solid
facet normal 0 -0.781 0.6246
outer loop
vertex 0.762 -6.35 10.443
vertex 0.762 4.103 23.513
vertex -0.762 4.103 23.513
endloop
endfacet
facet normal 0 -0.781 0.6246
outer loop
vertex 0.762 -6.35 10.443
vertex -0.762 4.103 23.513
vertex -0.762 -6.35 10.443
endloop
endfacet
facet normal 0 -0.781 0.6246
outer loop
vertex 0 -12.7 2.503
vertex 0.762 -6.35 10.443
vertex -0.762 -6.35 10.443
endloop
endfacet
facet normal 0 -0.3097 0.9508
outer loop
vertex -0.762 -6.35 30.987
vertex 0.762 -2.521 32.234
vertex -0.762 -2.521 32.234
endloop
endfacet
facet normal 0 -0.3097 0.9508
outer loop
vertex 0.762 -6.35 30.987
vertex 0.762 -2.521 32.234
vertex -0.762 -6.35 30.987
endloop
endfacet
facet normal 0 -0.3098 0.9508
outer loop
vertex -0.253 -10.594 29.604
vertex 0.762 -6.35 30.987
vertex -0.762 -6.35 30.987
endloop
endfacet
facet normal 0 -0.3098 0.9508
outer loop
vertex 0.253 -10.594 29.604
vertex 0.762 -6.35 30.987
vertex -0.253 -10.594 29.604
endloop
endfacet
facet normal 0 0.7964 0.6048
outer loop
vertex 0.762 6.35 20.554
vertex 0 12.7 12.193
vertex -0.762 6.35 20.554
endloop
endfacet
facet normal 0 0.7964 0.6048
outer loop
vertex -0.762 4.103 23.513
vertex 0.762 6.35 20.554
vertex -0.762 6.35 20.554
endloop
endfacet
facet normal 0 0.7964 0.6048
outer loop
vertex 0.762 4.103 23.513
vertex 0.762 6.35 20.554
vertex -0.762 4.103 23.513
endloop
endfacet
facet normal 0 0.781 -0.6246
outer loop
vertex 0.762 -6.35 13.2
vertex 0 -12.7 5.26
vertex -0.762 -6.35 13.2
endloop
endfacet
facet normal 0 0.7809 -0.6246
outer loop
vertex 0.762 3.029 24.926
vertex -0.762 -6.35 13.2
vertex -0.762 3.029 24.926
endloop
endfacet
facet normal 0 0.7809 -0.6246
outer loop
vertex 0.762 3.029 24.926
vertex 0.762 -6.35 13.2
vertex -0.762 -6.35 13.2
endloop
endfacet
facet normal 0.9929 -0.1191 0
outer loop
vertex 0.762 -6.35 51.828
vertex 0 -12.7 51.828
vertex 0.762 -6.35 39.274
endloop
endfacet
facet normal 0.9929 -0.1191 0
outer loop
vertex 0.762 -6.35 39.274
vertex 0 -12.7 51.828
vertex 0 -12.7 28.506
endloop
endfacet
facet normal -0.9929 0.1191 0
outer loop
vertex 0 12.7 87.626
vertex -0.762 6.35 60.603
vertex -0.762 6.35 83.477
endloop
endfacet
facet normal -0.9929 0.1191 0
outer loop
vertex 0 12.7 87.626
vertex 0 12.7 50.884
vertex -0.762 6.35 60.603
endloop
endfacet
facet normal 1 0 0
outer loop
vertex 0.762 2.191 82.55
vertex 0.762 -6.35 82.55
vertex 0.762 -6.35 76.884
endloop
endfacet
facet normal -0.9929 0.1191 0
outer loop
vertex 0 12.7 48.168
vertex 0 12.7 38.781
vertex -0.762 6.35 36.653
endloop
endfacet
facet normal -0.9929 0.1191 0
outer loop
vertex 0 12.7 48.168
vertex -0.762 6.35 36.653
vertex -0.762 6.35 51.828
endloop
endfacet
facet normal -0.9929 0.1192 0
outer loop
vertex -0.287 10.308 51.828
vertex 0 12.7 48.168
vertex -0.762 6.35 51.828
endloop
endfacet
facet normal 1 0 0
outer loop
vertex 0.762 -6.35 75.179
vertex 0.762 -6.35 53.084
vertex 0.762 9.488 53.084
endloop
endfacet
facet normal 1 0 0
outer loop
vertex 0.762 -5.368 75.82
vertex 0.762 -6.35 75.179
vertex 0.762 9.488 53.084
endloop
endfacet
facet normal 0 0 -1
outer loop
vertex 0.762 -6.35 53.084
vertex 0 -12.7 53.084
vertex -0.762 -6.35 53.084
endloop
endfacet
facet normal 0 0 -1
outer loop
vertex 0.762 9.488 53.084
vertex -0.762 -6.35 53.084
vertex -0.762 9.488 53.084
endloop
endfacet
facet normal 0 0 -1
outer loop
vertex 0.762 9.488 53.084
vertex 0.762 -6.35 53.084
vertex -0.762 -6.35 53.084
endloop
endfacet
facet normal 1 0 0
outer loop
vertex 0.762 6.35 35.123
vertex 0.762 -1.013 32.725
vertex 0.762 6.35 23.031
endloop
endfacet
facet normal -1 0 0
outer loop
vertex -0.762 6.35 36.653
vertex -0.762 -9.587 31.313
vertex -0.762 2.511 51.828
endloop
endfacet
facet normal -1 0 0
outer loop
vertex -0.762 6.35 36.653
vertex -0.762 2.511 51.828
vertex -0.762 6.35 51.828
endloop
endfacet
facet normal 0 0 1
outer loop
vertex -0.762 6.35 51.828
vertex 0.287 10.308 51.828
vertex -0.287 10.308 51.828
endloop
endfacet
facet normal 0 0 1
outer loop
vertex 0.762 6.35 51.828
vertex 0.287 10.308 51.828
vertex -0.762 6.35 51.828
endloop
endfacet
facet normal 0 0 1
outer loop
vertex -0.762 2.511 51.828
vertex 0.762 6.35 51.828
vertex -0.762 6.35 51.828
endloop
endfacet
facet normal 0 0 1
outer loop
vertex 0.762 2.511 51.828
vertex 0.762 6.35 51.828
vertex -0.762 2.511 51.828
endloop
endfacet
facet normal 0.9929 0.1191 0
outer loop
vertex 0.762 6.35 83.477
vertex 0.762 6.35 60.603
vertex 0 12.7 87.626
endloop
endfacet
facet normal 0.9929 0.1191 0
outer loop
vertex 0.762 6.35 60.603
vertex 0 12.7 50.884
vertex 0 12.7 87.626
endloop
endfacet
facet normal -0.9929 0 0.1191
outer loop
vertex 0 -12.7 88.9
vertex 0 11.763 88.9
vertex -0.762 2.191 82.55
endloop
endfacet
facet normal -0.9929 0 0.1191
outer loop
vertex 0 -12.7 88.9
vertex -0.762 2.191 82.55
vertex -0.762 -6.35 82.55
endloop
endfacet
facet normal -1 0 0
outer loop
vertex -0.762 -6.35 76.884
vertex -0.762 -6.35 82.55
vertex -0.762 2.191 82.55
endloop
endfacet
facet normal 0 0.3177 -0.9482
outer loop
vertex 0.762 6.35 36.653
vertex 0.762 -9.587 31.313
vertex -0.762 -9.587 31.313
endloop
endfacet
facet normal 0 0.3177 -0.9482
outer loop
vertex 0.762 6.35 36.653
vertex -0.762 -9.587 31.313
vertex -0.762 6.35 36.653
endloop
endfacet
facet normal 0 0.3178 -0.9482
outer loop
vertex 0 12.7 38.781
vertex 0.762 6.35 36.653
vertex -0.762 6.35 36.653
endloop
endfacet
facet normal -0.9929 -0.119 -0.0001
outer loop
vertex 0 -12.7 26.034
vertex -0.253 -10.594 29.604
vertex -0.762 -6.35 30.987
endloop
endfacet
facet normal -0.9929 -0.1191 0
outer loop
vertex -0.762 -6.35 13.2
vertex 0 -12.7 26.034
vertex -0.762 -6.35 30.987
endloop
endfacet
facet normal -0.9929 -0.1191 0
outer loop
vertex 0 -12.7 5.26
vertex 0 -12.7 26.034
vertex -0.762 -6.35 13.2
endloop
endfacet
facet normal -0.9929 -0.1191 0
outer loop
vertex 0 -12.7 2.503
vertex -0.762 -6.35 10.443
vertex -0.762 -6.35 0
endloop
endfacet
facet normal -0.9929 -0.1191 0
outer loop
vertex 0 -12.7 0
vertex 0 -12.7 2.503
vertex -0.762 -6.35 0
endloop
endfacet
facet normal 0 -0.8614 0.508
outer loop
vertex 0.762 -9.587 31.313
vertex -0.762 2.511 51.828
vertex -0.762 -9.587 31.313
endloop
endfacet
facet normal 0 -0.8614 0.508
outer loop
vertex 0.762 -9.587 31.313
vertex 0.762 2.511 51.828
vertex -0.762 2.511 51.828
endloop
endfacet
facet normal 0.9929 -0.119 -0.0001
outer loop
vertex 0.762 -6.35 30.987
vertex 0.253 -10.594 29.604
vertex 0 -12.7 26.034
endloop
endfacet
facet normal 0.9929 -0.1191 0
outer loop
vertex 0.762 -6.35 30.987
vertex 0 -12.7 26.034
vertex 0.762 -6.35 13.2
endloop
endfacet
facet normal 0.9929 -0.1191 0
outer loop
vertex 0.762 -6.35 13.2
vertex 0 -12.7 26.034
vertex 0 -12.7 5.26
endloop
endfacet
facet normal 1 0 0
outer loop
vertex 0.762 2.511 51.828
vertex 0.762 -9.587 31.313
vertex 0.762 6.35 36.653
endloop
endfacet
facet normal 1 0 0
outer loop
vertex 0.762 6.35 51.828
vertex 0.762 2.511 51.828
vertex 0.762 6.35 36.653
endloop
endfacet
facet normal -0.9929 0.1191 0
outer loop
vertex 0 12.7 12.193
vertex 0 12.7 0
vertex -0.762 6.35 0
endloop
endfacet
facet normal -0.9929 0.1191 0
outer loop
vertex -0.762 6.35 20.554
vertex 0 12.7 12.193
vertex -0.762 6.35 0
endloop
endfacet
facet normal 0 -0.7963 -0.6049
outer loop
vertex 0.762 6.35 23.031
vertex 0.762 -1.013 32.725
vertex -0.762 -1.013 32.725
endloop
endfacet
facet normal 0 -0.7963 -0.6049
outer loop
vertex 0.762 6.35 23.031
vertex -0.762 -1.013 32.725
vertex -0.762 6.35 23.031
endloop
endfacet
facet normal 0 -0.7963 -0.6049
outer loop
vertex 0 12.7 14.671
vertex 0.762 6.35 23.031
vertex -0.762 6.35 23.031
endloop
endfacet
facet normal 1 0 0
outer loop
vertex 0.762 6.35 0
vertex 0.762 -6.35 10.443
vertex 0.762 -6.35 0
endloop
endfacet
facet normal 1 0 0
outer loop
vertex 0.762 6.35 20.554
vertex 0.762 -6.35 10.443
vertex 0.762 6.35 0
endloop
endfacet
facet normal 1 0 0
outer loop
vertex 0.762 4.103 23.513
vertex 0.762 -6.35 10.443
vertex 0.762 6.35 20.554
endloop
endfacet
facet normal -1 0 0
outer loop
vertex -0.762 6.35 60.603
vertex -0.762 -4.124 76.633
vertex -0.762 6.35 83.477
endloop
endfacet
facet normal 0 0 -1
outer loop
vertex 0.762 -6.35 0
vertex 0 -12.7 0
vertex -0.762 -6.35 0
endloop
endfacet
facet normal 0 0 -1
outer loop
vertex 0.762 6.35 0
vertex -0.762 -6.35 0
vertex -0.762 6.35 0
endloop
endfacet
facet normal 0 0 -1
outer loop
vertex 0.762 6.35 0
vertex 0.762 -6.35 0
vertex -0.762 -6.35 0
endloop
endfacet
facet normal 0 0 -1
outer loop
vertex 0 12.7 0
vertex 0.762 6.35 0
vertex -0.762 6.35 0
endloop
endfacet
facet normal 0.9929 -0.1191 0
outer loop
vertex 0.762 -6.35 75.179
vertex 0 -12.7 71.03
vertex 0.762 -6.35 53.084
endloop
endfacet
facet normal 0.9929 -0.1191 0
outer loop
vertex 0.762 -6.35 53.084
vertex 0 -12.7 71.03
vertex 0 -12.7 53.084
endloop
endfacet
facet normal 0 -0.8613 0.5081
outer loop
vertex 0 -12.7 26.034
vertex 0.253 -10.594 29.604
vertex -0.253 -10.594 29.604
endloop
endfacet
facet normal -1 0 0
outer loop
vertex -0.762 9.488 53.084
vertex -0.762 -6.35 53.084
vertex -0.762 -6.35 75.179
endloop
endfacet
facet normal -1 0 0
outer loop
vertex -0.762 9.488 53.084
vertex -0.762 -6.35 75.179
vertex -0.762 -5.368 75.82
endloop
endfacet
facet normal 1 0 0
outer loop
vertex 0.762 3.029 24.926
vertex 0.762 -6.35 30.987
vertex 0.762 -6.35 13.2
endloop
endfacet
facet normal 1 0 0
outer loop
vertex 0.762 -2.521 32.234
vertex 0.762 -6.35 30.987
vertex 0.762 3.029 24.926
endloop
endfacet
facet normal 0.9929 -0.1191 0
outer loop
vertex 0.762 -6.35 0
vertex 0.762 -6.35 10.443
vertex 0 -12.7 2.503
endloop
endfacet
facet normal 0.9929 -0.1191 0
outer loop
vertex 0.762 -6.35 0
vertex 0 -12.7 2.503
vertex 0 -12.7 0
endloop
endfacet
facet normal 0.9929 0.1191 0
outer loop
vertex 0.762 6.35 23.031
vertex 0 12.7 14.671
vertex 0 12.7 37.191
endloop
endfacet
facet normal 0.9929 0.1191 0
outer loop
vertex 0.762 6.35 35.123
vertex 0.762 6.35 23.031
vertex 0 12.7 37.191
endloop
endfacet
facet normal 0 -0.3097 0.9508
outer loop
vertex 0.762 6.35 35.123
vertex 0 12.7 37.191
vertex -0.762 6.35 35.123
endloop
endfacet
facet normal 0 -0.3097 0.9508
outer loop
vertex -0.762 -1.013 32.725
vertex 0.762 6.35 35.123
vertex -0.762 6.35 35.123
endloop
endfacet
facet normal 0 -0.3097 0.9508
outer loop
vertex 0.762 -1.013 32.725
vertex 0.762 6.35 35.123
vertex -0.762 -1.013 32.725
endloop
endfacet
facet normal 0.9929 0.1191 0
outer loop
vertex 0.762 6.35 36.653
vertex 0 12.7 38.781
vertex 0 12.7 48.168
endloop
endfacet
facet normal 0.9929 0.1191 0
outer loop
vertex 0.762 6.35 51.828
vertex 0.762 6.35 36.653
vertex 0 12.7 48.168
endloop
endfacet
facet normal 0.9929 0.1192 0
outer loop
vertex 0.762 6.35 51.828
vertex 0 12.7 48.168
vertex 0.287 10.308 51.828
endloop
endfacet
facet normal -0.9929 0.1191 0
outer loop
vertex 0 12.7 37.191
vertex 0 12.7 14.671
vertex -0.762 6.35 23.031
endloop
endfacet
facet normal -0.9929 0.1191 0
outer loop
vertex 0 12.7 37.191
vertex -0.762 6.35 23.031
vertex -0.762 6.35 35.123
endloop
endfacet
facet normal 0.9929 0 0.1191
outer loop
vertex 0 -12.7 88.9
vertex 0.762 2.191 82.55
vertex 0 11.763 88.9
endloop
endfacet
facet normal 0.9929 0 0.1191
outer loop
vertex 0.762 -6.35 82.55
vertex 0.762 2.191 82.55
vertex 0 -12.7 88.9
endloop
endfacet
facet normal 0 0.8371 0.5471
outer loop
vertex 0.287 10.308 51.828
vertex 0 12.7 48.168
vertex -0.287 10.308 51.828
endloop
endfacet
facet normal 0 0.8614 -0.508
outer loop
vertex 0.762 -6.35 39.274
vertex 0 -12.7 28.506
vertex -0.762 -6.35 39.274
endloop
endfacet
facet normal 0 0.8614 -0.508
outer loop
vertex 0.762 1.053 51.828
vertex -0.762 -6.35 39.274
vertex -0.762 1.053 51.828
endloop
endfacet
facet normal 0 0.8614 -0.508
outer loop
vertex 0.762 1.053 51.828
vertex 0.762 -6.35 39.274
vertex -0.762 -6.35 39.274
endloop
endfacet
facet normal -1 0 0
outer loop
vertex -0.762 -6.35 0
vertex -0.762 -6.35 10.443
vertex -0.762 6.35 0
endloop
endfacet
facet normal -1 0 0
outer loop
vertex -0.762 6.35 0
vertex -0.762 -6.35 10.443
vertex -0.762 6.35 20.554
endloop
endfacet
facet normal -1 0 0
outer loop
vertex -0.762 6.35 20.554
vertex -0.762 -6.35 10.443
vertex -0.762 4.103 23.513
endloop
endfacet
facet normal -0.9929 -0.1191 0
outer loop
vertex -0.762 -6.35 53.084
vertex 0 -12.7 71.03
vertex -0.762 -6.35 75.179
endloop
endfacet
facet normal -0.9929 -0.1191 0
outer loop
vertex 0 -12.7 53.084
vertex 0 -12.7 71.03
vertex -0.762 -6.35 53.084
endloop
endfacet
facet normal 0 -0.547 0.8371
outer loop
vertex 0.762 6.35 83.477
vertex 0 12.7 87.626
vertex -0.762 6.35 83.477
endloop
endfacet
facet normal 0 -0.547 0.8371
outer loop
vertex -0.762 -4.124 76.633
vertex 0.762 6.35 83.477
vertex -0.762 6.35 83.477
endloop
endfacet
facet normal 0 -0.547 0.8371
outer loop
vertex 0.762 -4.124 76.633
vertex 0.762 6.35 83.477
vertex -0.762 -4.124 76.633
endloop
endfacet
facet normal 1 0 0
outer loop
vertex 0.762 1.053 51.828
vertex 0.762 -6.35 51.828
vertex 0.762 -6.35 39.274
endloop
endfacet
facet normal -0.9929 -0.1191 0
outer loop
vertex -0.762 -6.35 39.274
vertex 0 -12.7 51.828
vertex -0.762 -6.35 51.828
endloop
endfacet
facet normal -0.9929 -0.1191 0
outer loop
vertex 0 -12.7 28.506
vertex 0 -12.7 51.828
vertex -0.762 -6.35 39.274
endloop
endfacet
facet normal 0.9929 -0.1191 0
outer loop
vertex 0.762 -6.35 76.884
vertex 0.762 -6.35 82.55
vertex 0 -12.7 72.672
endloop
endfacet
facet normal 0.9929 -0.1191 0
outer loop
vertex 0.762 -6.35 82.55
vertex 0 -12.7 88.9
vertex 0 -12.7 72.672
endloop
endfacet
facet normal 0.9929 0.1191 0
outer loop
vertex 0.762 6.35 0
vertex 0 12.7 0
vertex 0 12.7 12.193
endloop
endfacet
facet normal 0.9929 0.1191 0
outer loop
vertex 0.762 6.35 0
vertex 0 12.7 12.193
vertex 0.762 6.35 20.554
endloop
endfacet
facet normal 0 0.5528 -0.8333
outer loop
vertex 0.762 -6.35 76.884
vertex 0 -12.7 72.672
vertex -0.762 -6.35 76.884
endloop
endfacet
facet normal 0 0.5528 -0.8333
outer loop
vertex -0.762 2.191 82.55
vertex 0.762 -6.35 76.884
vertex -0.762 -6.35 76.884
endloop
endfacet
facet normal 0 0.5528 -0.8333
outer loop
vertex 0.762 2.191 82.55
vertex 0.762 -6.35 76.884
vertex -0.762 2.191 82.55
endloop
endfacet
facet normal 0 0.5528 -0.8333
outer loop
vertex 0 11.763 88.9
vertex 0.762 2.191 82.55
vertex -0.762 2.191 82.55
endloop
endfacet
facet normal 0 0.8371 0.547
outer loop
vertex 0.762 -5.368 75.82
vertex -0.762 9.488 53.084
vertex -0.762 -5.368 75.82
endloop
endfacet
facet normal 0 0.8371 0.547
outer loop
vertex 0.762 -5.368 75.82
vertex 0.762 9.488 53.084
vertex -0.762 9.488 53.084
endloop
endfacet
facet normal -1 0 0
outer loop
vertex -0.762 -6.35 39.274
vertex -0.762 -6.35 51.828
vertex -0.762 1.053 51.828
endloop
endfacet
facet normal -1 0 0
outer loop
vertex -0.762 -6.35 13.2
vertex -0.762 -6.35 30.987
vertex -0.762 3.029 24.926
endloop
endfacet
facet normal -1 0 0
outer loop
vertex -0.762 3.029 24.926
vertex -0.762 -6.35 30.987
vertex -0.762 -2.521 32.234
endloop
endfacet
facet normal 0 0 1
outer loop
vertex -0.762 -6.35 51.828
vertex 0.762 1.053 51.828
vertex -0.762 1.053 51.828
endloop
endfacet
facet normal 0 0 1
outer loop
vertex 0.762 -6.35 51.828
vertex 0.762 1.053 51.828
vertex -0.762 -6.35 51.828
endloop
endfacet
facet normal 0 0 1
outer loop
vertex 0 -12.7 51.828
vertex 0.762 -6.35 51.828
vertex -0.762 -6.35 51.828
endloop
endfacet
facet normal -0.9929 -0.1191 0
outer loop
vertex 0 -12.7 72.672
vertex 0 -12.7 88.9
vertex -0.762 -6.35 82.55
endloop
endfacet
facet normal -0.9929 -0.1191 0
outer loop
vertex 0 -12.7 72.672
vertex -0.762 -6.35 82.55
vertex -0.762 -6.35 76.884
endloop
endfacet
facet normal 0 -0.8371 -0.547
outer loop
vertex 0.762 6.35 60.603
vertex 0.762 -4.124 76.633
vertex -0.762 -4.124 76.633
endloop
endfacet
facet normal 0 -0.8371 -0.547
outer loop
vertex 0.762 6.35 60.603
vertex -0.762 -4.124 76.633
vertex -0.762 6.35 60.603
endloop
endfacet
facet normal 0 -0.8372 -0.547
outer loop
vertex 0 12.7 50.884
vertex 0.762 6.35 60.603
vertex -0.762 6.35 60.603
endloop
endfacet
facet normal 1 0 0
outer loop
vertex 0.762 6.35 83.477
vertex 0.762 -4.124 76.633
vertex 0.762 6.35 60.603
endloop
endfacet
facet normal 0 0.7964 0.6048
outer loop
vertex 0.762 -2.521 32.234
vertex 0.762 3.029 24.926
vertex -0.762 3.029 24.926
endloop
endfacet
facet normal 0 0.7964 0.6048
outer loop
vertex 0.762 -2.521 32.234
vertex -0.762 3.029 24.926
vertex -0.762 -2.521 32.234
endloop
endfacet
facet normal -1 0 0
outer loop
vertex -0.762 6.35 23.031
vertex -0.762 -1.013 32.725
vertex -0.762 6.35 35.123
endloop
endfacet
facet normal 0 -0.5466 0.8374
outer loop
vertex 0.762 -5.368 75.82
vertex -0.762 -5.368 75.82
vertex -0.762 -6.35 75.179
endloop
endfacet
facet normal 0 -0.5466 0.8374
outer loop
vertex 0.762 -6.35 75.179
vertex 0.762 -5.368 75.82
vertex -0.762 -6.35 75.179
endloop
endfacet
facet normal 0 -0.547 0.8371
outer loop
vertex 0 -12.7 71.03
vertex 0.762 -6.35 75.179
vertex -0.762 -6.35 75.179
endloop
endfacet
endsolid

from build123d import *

# Parameters (mm, degrees)
F1_DEPTH    = 0.762
F2_SIZE2    = 0.762
F2_SIZE     = 6.35
F2_2_SIZE2  = 0.76199
F2_2_SIZE   = 6.34999
F2_3_SIZE2  = 0.762
F2_3_SIZE   = 6.35
F2_4_SIZE2  = 0.76199
F2_4_SIZE   = 6.34999
F2_5_SIZE2  = 0.762
F2_5_SIZE   = 6.35
F2_6_SIZE2  = 0.76199
F2_6_SIZE   = 6.34999
F2_7_SIZE2  = 0.762
F2_7_SIZE   = 6.35
F2_8_SIZE2  = 0.76199
F2_8_SIZE   = 6.34999
F2_9_SIZE2  = 0.762
F2_9_SIZE   = 6.35
F2_10_SIZE2 = 0.76199
F2_10_SIZE  = 6.34999
F2_11_SIZE2 = 0.762
F2_11_SIZE  = 6.35
F2_12_SIZE2 = 0.76199
F2_12_SIZE  = 6.34999
F2_13_SIZE2 = 0.762
F2_13_SIZE  = 6.35
F2_14_SIZE2 = 0.76199
F2_14_SIZE  = 6.34999
F2_15_SIZE2 = 0.762
F2_15_SIZE  = 6.35
F2_16_SIZE2 = 0.76199
F2_16_SIZE  = 6.34999
F3_SIZE2    = 6.34999
F3_SIZE     = 0.76199


# Not quite as in the source:
# - a fillet or chamfer is up to 0.001 mm smaller than in the source, because OpenCascade refuses the exact size


with BuildPart() as f1:
    # F0 (on Right) → F1 (new body, symmetric)
    with BuildSketch(Plane.YZ):
        Polygon((-12.7, 51.828302443), (-12.7, 28.5059732678), (1.0529800206, 51.828302443), align=None)
    extrude(amount=F1_DEPTH, both=True)

    # F2#13
    f2_13_edges = [f1.edges().sort_by_distance(p)[0] for p in [
        (-0.762, -12.7, 40.167138),
    ]]
    f2_13_side = f1.faces().sort_by_distance((-0.762, -8.115673, 44.054193))[0]
    chamfer(f2_13_edges, length=F2_13_SIZE, length2=F2_13_SIZE2, reference=f2_13_side)

    # F2#14 (size 6.35 and 0.762 in the source; OpenCascade refuses exactly that, so slightly less here)
    f2_14_edges = [f1.edges().sort_by_distance(p)[0] for p in [
        (0.762, -12.7, 40.167138),
    ]]
    f2_14_side = f1.faces().sort_by_distance((0.762, -8.115673, 44.054193))[0]
    chamfer(f2_14_edges, length=F2_14_SIZE, length2=F2_14_SIZE2, reference=f2_14_side)


with BuildPart() as f1b:
    # F0 (on Right) → F1, piece 2 (new body, symmetric)
    with BuildSketch(Plane.YZ):
        Polygon((-12.7, 26.0336679026), (-12.7, 5.2599026822), (3.0286672094, 24.9264711231), (-2.5214019575, 32.2336712183), (-10.594333522, 29.6044610441), align=None)
    extrude(amount=F1_DEPTH, both=True)

    # F2#15
    f2_15_edges = [f1b.edges().sort_by_distance(p)[0] for p in [
        (-0.762, -12.7, 15.646785),
    ]]
    f2_15_side = f1b.faces().sort_by_distance((-0.762, -6.710937, 21.407423))[0]
    chamfer(f2_15_edges, length=F2_15_SIZE, length2=F2_15_SIZE2, reference=f2_15_side)

    # F2#16 (size 6.35 and 0.762 in the source; OpenCascade refuses exactly that, so slightly less here)
    f2_16_edges = [f1b.edges().sort_by_distance(p)[0] for p in [
        (0.762, -12.7, 15.646785),
    ]]
    f2_16_side = f1b.faces().sort_by_distance((0.762, -6.710937, 21.407423))[0]
    chamfer(f2_16_edges, length=F2_16_SIZE, length2=F2_16_SIZE2, reference=f2_16_side)


with BuildPart() as f1c:
    # F0 (on Right) → F1, piece 3 (new body, symmetric)
    with BuildSketch(Plane.YZ):
        Polygon((-4.1242268054, 76.6329197301), (12.7, 50.884090213), (12.7, 87.6258313656), align=None)
    extrude(amount=F1_DEPTH, both=True)

    # F2#3
    f2_3_edges = [f1c.edges().sort_by_distance(p)[0] for p in [
        (0.762, 12.7, 69.254961),
    ]]
    f2_3_side = f1c.faces().sort_by_distance((0.762, 7.091924, 71.71428))[0]
    chamfer(f2_3_edges, length=F2_3_SIZE, length2=F2_3_SIZE2, reference=f2_3_side)

    # F2#4 (size 6.35 and 0.762 in the source; OpenCascade refuses exactly that, so slightly less here)
    f2_4_edges = [f1c.edges().sort_by_distance(p)[0] for p in [
        (-0.762, 12.7, 69.254961),
    ]]
    f2_4_side = f1c.faces().sort_by_distance((-0.762, 7.091924, 71.71428))[0]
    chamfer(f2_4_edges, length=F2_4_SIZE, length2=F2_4_SIZE2, reference=f2_4_side)


with BuildPart() as f1d:
    # F0 (on Right) → F1, piece 4 (new body, symmetric)
    with BuildSketch(Plane.YZ):
        Polygon((-9.5868147053, 31.313013333), (12.7, 38.7808382511), (12.7, 48.1682026787), (10.3084991155, 51.828302443), (2.510877559, 51.828302443), align=None)
    extrude(amount=F1_DEPTH, both=True)

    # F2
    f2_edges = [f1d.edges().sort_by_distance(p)[0] for p in [
        (0.762, 12.7, 43.47452),
    ]]
    f2_side = f1d.faces().sort_by_distance((0.762, 3.707113, 42.31436))[0]
    chamfer(f2_edges, length=F2_SIZE, length2=F2_SIZE2, reference=f2_side)

    # F2#2 (size 6.35 and 0.762 in the source; OpenCascade refuses exactly that, so slightly less here)
    f2_2_edges = [f1d.edges().sort_by_distance(p)[0] for p in [
        (-0.762, 12.7, 43.47452),
    ]]
    f2_2_side = f1d.faces().sort_by_distance((-0.762, 3.707113, 42.31436))[0]
    chamfer(f2_2_edges, length=F2_2_SIZE, length2=F2_2_SIZE2, reference=f2_2_side)


with BuildPart() as f1e:
    # F0 (on Right) → F1, piece 5 (new body, symmetric)
    with BuildSketch(Plane.YZ):
        Polygon((-1.0126563937, 32.7250428043), (12.7, 14.6710112068), (12.7, 37.1910110116), align=None)
    extrude(amount=F1_DEPTH, both=True)

    # F2#5
    f2_5_edges = [f1e.edges().sort_by_distance(p)[0] for p in [
        (0.762, 12.7, 25.931011),
    ]]
    f2_5_side = f1e.faces().sort_by_distance((0.762, 8.129115, 28.195688))[0]
    chamfer(f2_5_edges, length=F2_5_SIZE, length2=F2_5_SIZE2, reference=f2_5_side)

    # F2#6 (size 6.35 and 0.762 in the source; OpenCascade refuses exactly that, so slightly less here)
    f2_6_edges = [f1e.edges().sort_by_distance(p)[0] for p in [
        (-0.762, 12.7, 25.931011),
    ]]
    f2_6_side = f1e.faces().sort_by_distance((-0.762, 8.129115, 28.195688))[0]
    chamfer(f2_6_edges, length=F2_6_SIZE, length2=F2_6_SIZE2, reference=f2_6_side)


with BuildPart() as f1f:
    # F0 (on Right) → F1, piece 6 (new body, symmetric)
    with BuildSketch(Plane.YZ):
        Polygon((-12.7, 0), (0, 0), (12.7, 0), (12.7, 12.1932309121), (4.1025487481, 23.5126027467), (-12.7, 2.5032908618), align=None)
    extrude(amount=F1_DEPTH, both=True)

    # F2#7
    f2_7_edges = [f1f.edges().sort_by_distance(p)[0] for p in [
        (0.762, 12.7, 6.096615),
        (0.762, -12.7, 1.251645),
    ]]
    f2_7_side = f1f.faces().sort_by_distance((0.762, 2.081715, 8.457296))[0]
    chamfer(f2_7_edges, length=F2_7_SIZE, length2=F2_7_SIZE2, reference=f2_7_side)

    # F2#8 (size 6.35 and 0.762 in the source; OpenCascade refuses exactly that, so slightly less here)
    f2_8_edges = [f1f.edges().sort_by_distance(p)[0] for p in [
        (-0.762, -12.7, 1.251645),
        (-0.762, 12.7, 6.096615),
    ]]
    f2_8_side = f1f.faces().sort_by_distance((-0.762, 2.081715, 8.457296))[0]
    chamfer(f2_8_edges, length=F2_8_SIZE, length2=F2_8_SIZE2, reference=f2_8_side)


with BuildPart() as f1g:
    # F0 (on Right) → F1, piece 7 (new body, symmetric)
    with BuildSketch(Plane.YZ):
        Polygon((11.7632681504, 88.9), (-12.7, 88.9), (-12.7, 72.6716294885), align=None)
    extrude(amount=F1_DEPTH, both=True)

    # F2#9
    f2_9_edges = [f1g.edges().sort_by_distance(p)[0] for p in [
        (-0.762, -12.7, 80.785815),
        (-0.762, -0.468366, 88.9),
    ]]
    f2_9_side = f1g.faces().sort_by_distance((-0.762, -4.545577, 83.490543))[0]
    chamfer(f2_9_edges, length=F2_9_SIZE, length2=F2_9_SIZE2, reference=f2_9_side)

    # F2#10 (size 6.35 and 0.762 in the source; OpenCascade refuses exactly that, so slightly less here)
    f2_10_edges = [f1g.edges().sort_by_distance(p)[0] for p in [
        (0.762, -12.7, 80.785815),
    ]]
    f2_10_side = f1g.faces().sort_by_distance((0.762, -4.545577, 83.490543))[0]
    chamfer(f2_10_edges, length=F2_10_SIZE, length2=F2_10_SIZE2, reference=f2_10_side)

    # F3 (size 0.762 and 6.35 in the source; OpenCascade refuses exactly that, so slightly less here)
    f3_edges = [f1g.edges().sort_by_distance(p)[0] for p in [
        (0.762, 2.706629, 88.9),
    ]]
    f3_side = f1g.faces().sort_by_distance((0.362059, 1.040187, 88.9))[0]
    chamfer(f3_edges, length=F3_SIZE, length2=F3_SIZE2, reference=f3_side)


with BuildPart() as f1h:
    # F0 (on Right) → F1, piece 8 (new body, symmetric)
    with BuildSketch(Plane.YZ):
        Polygon((-5.3678452737, 75.8203422436), (-12.7, 71.0295289755), (-12.7, 53.0840971504), (9.487965702, 53.0840971504), align=None)
    extrude(amount=F1_DEPTH, both=True)

    # F2#11
    f2_11_edges = [f1h.edges().sort_by_distance(p)[0] for p in [
        (-0.762, -12.7, 62.056813),
    ]]
    f2_11_side = f1h.faces().sort_by_distance((-0.762, -4.389957, 61.900294))[0]
    chamfer(f2_11_edges, length=F2_11_SIZE, length2=F2_11_SIZE2, reference=f2_11_side)

    # F2#12 (size 6.35 and 0.762 in the source; OpenCascade refuses exactly that, so slightly less here)
    f2_12_edges = [f1h.edges().sort_by_distance(p)[0] for p in [
        (0.762, -12.7, 62.056813),
    ]]
    f2_12_side = f1h.faces().sort_by_distance((0.762, -4.389957, 61.900294))[0]
    chamfer(f2_12_edges, length=F2_12_SIZE, length2=F2_12_SIZE2, reference=f2_12_side)


solid = Compound([f1.part, f1b.part, f1c.part, f1d.part, f1e.part, f1f.part, f1g.part, f1h.part])
